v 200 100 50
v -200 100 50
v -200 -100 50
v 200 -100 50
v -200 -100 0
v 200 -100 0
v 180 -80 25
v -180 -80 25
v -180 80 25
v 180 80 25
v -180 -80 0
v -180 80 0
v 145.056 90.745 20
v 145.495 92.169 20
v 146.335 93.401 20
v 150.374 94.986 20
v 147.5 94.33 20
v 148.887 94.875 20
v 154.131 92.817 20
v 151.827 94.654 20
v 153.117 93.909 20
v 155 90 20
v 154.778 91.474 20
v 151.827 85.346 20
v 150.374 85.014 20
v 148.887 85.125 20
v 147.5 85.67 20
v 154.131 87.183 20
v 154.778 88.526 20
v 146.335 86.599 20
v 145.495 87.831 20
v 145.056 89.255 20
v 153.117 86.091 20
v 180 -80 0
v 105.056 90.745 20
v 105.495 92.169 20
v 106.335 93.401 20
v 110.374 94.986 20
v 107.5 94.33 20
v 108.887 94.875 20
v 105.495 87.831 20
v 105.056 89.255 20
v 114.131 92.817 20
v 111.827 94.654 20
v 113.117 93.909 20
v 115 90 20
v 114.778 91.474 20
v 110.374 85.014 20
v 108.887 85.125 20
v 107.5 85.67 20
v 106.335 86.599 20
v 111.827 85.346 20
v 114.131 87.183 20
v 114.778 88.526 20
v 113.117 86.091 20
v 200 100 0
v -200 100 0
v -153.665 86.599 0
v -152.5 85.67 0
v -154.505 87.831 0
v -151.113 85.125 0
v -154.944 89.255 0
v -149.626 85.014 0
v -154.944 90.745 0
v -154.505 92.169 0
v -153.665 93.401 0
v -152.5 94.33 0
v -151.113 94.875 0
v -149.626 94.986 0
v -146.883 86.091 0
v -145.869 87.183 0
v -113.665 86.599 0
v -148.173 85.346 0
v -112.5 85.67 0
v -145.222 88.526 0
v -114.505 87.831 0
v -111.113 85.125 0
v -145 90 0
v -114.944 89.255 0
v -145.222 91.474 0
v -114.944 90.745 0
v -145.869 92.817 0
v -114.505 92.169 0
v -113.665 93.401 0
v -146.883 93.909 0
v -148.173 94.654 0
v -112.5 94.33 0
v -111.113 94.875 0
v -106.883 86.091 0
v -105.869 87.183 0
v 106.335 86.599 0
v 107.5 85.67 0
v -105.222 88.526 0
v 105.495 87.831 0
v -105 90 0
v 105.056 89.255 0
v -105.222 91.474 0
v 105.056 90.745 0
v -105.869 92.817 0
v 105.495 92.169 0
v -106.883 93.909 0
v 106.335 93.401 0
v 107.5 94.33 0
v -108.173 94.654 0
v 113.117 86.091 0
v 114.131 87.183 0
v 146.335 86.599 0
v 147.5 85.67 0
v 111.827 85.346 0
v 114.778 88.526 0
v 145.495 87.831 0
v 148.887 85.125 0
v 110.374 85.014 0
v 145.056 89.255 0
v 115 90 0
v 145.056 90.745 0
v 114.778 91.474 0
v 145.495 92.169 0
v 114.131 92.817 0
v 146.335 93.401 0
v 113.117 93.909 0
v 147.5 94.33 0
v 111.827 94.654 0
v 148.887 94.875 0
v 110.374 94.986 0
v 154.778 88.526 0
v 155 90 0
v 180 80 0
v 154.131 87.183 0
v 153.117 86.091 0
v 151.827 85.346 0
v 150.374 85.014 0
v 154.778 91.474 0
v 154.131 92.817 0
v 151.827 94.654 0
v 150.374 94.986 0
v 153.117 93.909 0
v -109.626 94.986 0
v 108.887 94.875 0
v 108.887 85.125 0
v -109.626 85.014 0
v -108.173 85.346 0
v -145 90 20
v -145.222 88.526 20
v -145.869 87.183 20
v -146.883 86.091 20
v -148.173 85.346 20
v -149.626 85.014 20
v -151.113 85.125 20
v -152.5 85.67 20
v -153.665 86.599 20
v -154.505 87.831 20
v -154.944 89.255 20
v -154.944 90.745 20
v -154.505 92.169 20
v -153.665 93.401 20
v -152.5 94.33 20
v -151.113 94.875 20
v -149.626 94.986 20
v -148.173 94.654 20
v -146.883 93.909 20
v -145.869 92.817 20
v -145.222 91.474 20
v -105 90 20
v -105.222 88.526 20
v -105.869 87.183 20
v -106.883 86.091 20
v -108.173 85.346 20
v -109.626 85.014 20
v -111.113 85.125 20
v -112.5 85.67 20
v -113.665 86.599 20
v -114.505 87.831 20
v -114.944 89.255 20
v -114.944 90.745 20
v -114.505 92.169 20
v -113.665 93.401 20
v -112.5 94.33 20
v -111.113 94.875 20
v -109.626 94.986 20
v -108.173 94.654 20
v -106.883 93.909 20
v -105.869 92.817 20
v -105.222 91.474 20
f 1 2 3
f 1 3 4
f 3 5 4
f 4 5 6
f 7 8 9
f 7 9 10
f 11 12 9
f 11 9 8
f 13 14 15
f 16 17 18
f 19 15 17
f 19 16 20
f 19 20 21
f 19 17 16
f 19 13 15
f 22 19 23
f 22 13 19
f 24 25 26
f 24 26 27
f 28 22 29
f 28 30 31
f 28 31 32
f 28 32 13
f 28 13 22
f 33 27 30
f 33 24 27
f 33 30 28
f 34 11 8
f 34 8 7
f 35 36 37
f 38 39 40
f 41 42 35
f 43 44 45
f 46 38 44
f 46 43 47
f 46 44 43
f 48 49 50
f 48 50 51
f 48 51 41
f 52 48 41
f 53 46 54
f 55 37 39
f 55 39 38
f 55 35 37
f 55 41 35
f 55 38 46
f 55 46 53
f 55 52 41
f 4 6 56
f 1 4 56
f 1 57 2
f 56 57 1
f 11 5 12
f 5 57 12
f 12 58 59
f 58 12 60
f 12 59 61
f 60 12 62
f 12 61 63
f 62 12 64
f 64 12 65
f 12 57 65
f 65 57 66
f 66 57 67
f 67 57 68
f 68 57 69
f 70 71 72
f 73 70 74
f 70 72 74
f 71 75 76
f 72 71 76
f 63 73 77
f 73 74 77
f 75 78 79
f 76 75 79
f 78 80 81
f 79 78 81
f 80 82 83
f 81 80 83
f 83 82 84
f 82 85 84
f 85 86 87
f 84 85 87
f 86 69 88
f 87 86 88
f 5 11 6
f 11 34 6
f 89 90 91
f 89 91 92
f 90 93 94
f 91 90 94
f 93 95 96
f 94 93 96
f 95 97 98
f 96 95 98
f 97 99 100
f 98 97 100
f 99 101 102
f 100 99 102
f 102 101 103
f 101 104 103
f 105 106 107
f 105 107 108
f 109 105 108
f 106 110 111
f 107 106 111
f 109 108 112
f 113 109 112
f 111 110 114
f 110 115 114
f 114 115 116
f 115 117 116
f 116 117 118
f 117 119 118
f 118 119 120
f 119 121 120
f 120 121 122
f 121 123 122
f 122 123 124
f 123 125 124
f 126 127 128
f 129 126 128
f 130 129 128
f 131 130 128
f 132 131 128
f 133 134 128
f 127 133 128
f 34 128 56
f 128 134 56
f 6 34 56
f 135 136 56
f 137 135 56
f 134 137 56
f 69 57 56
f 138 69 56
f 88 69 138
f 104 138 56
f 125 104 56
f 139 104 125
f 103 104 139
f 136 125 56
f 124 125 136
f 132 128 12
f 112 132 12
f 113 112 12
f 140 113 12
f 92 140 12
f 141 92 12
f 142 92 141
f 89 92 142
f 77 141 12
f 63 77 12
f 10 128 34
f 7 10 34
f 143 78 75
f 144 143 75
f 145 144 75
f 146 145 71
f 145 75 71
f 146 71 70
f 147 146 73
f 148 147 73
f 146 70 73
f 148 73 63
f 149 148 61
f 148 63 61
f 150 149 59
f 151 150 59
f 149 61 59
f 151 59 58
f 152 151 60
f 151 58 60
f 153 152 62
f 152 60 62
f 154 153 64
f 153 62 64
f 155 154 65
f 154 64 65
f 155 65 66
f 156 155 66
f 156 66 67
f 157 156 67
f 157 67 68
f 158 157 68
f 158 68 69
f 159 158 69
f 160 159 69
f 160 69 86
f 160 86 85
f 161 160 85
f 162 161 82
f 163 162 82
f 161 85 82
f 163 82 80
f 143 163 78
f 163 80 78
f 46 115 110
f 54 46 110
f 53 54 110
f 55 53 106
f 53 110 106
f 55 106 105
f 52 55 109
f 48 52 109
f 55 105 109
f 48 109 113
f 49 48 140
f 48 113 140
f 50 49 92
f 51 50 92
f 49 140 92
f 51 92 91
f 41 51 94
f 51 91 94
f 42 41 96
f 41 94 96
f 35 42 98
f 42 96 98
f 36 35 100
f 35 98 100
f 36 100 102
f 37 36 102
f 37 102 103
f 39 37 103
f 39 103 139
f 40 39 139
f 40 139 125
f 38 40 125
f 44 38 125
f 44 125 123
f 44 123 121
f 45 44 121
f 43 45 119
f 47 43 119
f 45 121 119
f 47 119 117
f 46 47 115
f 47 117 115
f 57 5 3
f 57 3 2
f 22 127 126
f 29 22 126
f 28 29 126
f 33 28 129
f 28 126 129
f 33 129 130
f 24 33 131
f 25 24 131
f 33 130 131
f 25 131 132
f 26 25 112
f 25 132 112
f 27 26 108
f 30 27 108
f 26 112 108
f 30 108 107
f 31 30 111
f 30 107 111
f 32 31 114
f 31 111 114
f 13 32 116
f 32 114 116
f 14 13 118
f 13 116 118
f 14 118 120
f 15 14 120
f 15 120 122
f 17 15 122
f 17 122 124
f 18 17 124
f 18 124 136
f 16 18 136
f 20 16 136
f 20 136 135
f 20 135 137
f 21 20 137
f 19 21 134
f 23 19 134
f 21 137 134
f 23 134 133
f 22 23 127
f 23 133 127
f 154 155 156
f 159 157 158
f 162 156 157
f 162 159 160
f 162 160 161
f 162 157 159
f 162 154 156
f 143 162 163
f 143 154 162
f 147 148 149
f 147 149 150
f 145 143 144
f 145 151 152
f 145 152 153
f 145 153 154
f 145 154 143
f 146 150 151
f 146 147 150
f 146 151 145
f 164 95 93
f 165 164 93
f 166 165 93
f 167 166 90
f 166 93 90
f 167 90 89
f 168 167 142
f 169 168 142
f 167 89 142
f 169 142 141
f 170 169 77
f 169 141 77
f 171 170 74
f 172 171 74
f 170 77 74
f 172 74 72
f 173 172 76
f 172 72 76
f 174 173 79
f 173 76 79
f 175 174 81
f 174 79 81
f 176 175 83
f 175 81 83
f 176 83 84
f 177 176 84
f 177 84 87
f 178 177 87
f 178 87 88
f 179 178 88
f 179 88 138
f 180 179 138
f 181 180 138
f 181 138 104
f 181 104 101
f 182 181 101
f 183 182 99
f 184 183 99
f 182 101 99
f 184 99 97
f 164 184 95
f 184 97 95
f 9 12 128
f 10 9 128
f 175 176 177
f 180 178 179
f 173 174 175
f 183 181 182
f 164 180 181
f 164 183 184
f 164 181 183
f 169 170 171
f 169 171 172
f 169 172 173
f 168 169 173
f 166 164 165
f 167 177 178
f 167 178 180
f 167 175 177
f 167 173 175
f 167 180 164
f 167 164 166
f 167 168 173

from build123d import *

# Parameters (mm, degrees)
F0_W     = 400
F0_H     = 200
F1_DEPTH = 50
F2_W     = 360
F2_H     = 160
F3_DEPTH = 25
F4_R     = 5
F5_DEPTH = 20


with BuildPart() as f1:
    # F0 (on Top) → F1 (new body)
    with BuildSketch(Plane.XY):
        Rectangle(F0_W, F0_H)
    extrude(amount=F1_DEPTH)

    # F2 (on face) → F3 (cut)
    with BuildSketch(Plane(origin=(0, 0, 0), x_dir=(1, 0, 0), z_dir=(0, 0, -1))):
        Rectangle(F2_W, F2_H)
    extrude(amount=-F3_DEPTH, mode=Mode.SUBTRACT)

    # F4 (on face) → F5 (cut)
    with BuildSketch(Plane(origin=(0, 0, 0), x_dir=(1, 0, 0), z_dir=(0, 0, -1))):
        with Locations((-150, -90)):
            Circle(F4_R)
        with Locations((-110, -90)):
            Circle(F4_R)
        with Locations((110, -90)):
            Circle(F4_R)
        with Locations((150, -90)):
            Circle(F4_R)
    extrude(amount=-F5_DEPTH, mode=Mode.SUBTRACT)


solid = f1.part
